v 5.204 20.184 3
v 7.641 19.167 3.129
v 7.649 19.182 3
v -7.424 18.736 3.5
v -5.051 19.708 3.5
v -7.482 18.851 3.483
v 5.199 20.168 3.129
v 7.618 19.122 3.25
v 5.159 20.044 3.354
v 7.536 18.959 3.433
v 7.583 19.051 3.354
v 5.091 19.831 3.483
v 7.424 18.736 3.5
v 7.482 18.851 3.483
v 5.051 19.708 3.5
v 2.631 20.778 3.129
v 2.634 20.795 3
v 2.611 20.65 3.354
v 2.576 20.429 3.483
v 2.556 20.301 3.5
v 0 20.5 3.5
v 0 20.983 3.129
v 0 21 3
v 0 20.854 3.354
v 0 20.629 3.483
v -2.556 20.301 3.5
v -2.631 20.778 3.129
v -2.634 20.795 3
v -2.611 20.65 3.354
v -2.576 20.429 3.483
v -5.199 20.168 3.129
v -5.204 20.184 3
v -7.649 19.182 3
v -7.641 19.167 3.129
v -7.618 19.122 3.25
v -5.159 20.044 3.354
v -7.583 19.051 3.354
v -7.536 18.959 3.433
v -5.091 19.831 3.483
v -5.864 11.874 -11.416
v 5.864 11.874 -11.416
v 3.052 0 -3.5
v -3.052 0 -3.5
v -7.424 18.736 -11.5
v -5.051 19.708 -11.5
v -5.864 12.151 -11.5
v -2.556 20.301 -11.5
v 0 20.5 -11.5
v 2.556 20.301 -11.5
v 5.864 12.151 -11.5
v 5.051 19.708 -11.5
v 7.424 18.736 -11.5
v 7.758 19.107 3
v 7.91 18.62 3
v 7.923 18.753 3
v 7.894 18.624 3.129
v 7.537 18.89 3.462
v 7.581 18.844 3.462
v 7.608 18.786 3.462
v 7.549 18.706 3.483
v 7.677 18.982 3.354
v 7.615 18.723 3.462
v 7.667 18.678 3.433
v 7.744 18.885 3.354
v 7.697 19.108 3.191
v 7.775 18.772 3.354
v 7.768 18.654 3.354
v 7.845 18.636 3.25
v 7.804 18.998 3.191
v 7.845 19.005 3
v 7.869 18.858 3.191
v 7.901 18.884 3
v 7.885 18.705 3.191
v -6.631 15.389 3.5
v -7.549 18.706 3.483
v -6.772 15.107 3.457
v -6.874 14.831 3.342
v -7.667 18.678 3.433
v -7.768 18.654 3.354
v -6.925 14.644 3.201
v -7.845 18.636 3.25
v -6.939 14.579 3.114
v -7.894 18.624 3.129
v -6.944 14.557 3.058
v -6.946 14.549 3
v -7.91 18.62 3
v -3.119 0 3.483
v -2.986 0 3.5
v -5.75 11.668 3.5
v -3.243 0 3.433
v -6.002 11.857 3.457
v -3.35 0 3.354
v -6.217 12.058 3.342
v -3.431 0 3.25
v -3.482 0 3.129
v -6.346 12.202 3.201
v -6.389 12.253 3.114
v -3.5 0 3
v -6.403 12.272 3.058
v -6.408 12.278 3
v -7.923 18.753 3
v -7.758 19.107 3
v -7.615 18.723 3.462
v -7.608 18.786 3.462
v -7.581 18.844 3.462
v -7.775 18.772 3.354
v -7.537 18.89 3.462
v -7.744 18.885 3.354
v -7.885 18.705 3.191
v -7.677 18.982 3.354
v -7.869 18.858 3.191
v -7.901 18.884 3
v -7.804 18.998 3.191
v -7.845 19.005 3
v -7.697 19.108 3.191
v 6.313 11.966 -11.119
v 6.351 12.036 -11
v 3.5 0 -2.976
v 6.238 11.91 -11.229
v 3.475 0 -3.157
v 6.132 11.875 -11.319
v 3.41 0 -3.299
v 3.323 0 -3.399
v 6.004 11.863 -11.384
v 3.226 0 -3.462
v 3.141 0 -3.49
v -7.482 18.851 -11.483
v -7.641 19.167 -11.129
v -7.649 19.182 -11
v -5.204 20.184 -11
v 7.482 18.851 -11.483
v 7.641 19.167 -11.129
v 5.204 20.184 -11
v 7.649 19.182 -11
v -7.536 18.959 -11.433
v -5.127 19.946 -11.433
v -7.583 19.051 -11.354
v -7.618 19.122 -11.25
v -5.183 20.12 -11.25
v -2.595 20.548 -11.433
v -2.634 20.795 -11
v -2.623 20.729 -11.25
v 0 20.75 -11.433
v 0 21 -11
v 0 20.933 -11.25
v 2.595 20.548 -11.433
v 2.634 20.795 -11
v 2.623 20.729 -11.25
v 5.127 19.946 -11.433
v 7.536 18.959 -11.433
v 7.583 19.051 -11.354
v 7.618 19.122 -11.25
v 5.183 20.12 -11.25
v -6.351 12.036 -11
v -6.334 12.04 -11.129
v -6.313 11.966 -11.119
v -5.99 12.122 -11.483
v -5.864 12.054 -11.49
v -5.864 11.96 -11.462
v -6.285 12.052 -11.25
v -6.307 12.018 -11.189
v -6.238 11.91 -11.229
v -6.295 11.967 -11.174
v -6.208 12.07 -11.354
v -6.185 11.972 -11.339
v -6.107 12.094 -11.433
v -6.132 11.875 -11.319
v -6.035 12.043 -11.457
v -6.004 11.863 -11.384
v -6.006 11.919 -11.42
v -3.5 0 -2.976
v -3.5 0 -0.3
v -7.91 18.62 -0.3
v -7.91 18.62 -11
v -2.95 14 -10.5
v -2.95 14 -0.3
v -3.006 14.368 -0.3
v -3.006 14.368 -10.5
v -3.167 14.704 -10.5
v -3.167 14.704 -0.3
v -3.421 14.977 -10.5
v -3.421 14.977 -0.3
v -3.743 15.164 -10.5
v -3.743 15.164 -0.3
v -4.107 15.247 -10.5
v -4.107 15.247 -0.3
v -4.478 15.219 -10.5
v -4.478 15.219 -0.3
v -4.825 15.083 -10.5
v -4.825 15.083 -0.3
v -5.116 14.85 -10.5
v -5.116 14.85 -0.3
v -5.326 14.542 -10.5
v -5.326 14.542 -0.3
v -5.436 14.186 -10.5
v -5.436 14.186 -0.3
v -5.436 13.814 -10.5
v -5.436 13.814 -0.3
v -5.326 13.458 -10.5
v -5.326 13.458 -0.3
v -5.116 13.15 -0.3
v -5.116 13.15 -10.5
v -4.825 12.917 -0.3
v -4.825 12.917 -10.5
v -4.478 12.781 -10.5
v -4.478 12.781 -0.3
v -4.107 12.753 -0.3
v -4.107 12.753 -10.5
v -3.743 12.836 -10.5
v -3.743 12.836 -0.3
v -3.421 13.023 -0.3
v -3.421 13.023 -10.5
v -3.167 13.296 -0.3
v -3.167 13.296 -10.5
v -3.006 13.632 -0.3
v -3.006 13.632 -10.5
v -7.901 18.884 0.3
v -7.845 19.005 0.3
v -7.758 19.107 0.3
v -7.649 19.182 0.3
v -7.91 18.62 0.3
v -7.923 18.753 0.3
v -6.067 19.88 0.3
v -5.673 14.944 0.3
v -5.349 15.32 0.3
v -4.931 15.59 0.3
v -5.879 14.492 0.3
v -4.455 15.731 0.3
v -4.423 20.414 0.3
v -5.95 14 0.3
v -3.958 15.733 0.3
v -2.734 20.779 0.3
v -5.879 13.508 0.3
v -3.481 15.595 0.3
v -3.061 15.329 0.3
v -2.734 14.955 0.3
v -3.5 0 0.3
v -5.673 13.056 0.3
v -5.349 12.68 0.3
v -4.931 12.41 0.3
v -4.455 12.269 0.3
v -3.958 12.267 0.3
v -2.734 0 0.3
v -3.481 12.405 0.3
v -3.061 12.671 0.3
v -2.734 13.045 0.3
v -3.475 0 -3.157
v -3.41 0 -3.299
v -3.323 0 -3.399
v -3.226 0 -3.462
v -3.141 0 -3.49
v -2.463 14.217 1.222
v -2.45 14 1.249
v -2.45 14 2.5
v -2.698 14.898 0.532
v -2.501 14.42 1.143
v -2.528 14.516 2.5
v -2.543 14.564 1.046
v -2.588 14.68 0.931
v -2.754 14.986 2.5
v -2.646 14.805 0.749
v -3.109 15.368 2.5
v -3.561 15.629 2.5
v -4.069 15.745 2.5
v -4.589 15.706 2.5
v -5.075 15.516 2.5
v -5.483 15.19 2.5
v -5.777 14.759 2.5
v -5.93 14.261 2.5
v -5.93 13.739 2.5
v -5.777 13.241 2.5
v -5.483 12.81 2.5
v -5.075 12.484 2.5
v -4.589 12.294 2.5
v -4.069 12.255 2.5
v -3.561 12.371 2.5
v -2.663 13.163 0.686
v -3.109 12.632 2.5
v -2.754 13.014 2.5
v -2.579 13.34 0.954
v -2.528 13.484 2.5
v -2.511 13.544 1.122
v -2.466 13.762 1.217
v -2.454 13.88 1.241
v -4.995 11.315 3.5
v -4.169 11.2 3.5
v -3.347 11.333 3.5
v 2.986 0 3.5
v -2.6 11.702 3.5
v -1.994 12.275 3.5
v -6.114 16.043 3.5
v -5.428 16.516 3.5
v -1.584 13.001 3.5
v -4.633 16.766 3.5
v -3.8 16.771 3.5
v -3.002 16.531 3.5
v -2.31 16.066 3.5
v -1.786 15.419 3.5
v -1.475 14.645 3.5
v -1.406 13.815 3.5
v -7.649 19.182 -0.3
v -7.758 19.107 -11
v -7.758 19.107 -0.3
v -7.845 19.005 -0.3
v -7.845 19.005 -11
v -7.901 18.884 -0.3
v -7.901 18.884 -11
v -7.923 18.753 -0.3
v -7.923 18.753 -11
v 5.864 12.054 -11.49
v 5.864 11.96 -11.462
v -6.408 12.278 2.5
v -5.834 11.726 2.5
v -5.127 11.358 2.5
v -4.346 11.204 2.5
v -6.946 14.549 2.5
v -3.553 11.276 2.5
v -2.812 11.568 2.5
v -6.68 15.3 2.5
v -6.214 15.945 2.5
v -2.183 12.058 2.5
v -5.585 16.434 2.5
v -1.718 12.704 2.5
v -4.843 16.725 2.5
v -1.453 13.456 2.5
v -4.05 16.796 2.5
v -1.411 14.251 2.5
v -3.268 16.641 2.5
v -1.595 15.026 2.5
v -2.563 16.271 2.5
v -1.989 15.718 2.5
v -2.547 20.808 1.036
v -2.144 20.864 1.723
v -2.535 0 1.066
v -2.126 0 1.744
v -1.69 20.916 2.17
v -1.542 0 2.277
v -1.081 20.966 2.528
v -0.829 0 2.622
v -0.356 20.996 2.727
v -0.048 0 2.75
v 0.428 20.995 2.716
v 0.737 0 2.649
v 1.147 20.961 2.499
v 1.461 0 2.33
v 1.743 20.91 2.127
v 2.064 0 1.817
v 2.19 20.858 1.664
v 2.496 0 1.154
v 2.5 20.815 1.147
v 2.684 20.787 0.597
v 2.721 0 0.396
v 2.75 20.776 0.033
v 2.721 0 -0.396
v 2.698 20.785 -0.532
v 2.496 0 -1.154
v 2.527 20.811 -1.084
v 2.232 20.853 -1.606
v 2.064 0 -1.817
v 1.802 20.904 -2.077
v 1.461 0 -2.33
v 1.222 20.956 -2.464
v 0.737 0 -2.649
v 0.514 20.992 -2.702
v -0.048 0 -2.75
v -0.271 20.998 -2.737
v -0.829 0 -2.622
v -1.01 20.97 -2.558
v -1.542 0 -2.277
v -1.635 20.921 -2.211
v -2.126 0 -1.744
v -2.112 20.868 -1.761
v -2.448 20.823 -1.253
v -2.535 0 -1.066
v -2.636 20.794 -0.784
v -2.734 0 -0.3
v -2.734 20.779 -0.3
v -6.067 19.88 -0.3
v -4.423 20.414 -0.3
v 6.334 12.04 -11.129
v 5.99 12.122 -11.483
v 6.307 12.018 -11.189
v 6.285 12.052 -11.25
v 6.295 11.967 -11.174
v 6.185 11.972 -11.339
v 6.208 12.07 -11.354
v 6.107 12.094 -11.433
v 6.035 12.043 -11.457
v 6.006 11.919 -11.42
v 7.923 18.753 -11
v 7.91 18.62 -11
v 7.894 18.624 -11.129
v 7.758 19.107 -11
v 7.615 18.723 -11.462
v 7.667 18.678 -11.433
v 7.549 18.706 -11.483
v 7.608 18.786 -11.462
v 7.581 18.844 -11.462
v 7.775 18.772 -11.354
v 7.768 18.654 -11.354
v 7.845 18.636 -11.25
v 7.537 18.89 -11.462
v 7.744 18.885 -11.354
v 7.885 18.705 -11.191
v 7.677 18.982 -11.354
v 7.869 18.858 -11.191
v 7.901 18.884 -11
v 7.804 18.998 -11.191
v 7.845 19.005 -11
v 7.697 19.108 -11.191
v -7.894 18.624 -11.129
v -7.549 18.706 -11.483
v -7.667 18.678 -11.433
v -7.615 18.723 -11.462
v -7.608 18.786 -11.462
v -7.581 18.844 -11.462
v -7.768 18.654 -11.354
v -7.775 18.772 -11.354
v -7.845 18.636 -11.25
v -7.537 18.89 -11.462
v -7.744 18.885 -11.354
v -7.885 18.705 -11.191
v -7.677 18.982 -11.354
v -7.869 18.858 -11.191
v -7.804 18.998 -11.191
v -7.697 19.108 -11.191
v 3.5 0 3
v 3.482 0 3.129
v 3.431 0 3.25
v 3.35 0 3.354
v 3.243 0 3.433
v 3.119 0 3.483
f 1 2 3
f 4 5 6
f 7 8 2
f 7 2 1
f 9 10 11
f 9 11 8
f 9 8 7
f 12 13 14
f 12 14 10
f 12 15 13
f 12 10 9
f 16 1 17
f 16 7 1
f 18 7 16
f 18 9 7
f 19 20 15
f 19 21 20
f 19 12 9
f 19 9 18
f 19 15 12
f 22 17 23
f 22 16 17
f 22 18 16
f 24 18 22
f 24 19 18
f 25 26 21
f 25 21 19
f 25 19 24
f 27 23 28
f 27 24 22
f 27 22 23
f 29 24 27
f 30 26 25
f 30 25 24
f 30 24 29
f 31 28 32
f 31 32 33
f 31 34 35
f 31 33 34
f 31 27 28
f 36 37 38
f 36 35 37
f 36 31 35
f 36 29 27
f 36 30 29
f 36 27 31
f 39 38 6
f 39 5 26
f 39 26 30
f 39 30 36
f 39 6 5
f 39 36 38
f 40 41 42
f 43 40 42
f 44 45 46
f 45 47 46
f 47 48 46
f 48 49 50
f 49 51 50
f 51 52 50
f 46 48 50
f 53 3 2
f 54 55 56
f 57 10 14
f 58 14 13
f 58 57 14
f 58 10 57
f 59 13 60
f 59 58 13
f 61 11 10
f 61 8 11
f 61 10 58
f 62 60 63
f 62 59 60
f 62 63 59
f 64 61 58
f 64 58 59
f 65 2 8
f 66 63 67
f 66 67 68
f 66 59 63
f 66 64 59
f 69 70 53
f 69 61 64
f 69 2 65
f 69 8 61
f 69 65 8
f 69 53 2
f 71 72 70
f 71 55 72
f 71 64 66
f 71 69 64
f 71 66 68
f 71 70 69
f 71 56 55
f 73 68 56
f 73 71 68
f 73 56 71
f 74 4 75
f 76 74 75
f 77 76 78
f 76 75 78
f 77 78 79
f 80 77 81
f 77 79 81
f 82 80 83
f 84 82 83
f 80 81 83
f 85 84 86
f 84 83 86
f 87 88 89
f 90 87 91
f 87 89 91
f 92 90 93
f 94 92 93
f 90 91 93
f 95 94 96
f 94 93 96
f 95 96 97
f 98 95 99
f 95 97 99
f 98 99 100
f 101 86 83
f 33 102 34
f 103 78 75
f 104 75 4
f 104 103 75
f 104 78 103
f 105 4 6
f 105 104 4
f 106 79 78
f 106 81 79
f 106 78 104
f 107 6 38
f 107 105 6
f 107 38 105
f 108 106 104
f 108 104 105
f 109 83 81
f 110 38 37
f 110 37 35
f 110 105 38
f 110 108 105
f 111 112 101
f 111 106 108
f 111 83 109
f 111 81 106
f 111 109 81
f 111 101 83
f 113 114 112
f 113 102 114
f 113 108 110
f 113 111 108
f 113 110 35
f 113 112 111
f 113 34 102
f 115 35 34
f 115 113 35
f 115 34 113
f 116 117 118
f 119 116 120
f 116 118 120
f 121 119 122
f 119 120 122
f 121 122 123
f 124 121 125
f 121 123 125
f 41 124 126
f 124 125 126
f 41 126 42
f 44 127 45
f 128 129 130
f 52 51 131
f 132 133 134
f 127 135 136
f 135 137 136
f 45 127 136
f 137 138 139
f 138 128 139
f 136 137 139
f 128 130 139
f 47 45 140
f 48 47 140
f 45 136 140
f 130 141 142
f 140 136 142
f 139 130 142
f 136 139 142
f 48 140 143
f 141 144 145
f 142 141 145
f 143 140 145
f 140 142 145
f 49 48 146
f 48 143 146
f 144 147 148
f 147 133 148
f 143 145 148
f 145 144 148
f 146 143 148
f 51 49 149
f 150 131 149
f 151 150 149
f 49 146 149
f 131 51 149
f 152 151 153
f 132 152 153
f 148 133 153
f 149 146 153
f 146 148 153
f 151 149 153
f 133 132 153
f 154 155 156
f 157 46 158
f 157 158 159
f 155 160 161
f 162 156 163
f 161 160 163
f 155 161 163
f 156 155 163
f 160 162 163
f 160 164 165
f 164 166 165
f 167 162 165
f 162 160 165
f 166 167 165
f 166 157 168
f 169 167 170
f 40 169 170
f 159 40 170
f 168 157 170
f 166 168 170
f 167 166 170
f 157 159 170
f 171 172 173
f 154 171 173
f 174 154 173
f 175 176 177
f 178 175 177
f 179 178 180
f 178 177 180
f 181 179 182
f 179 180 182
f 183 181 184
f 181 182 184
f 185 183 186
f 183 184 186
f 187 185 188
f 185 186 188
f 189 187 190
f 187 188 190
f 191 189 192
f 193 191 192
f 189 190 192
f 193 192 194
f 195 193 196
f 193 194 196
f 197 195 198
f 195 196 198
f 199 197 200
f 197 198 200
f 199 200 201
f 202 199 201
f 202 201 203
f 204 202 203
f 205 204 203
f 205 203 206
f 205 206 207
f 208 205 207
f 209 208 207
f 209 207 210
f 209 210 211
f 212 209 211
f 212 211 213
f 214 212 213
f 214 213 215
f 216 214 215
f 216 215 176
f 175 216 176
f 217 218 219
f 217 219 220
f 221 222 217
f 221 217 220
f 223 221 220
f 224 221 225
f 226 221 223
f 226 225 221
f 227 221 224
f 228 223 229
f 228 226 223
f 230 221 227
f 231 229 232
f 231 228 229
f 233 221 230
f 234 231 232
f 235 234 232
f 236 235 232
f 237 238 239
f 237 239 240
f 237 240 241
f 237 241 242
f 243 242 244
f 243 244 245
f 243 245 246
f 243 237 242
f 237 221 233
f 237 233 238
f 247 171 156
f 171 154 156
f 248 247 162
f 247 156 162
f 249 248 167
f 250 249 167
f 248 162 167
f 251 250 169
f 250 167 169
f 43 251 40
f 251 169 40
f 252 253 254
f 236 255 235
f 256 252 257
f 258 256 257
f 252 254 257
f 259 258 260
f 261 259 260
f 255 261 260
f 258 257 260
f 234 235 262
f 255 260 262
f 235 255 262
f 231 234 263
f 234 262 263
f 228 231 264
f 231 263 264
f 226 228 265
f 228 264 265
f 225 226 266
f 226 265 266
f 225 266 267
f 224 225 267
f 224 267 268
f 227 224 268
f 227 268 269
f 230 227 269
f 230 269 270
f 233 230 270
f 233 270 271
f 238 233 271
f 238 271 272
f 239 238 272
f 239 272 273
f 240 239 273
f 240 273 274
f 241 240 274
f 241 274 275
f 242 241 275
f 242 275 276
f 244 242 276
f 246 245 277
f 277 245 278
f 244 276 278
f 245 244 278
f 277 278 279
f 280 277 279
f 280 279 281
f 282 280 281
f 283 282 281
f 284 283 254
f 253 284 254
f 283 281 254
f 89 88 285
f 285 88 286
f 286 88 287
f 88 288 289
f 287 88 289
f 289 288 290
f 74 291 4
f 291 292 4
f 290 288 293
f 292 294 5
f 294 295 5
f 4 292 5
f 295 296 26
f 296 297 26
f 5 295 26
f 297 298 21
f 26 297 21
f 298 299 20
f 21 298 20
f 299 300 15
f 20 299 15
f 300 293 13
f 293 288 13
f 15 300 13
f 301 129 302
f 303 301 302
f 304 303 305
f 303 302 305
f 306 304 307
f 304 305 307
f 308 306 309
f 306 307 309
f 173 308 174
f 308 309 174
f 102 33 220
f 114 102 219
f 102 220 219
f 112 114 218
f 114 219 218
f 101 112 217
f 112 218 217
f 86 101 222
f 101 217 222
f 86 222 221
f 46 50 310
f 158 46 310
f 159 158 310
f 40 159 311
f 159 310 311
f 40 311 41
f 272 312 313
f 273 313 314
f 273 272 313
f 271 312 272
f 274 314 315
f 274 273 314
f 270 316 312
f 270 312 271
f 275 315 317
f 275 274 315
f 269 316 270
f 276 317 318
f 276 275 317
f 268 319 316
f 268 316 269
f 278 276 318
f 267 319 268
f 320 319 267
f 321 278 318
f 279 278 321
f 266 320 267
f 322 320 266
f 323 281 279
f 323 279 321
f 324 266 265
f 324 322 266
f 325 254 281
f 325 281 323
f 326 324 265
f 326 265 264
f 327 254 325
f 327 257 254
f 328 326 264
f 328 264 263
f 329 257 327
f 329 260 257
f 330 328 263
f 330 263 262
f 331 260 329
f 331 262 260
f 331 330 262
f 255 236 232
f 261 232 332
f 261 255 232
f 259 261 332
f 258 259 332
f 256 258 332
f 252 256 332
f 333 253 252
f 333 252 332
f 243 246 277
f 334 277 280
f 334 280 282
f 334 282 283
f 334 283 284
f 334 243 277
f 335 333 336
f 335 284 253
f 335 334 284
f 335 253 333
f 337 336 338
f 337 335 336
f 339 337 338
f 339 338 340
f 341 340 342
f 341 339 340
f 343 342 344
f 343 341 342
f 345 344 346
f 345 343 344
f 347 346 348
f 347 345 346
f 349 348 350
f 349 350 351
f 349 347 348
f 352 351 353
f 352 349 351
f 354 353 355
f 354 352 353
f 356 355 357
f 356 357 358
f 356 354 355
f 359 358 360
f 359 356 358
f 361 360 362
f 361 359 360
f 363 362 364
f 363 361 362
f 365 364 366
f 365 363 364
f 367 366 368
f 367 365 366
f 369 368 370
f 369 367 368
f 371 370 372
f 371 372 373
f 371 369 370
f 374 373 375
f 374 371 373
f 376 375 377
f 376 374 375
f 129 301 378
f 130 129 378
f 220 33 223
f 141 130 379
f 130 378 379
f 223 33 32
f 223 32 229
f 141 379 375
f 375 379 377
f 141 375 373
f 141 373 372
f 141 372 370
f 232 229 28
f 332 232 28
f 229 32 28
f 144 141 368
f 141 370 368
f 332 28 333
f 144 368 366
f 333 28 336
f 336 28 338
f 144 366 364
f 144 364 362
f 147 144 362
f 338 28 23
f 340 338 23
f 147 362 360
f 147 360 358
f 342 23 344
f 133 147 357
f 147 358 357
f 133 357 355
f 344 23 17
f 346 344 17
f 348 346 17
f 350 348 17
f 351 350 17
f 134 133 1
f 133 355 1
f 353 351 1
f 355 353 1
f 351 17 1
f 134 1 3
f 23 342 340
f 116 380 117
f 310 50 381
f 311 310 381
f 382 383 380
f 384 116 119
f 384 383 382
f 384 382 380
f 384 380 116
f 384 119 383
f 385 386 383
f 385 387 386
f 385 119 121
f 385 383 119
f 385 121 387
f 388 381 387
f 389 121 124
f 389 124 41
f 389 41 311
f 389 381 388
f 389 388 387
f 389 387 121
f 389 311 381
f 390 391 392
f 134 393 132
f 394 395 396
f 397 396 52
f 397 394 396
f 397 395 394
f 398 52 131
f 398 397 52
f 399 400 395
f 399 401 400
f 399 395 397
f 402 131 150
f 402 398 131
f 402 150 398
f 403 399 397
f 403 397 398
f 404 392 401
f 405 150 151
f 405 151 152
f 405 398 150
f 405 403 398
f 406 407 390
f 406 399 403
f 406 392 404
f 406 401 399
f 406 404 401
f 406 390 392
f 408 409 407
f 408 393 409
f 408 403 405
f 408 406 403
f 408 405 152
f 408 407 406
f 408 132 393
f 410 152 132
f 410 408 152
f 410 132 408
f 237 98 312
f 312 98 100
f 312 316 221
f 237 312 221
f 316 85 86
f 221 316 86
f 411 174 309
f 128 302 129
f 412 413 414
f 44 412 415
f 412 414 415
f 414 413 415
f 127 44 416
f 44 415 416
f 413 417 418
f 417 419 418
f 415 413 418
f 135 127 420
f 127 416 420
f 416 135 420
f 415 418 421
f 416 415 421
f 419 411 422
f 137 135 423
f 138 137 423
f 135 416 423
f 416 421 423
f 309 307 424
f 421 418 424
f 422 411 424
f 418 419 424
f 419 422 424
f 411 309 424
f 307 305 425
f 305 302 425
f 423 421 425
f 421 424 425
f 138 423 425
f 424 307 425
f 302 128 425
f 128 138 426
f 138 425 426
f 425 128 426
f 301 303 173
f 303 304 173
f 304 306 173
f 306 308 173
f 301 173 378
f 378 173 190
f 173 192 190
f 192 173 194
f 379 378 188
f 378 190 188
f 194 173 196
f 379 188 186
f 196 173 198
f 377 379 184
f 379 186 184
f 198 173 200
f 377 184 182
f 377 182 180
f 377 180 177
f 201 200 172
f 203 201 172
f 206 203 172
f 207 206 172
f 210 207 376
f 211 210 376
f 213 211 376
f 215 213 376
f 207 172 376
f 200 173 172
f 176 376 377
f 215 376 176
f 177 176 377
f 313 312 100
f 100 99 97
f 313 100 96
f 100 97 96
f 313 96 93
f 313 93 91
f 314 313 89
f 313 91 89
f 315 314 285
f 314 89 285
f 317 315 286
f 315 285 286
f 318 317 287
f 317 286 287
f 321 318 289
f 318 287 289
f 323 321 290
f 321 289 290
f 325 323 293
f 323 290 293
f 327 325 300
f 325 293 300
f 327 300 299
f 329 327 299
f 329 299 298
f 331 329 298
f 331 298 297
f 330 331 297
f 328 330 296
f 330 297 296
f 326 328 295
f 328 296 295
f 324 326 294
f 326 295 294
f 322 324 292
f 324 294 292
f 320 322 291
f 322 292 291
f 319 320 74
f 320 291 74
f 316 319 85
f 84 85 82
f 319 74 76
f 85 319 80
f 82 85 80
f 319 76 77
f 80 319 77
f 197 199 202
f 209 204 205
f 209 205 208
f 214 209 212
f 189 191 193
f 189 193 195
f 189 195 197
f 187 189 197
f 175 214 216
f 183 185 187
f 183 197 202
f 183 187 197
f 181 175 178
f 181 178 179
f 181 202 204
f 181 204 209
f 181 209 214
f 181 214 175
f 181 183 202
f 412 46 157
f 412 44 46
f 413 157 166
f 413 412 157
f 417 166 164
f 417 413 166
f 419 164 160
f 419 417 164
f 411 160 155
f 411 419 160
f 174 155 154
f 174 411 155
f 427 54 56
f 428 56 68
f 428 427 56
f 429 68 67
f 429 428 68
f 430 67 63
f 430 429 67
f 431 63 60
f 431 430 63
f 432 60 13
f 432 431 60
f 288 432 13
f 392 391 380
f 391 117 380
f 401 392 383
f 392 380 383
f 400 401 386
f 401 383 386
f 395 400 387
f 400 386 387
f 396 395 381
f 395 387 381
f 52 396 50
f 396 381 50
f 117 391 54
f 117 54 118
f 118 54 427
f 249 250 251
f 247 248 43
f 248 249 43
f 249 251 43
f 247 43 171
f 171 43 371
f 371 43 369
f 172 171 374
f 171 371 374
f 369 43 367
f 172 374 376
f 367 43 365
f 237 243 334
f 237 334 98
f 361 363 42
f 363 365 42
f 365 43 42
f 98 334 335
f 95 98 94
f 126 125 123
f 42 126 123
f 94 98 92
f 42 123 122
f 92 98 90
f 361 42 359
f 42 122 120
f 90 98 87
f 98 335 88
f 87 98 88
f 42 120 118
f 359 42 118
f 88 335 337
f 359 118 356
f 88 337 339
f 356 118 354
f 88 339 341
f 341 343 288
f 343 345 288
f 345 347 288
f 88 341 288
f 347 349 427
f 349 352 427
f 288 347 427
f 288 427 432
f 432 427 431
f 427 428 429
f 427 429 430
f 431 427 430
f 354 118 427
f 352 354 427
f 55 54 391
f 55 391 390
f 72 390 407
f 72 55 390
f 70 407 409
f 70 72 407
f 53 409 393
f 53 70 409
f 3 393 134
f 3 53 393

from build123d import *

# Parameters (mm, degrees)
EXTRUSION1_DEPTH             = 8
ESQUISSE2_OUTSIDE_W          = 24.072
ESQUISSE2_OUTSIDE_H          = 29.072
ENL_V_MAT_EXTRU_1_DEPTH      = 4.5
ENL_V_MAT_EXTRU_1_DEPTH_BACK = 12.5
CONG_1_R                     = 0.5
ESQUISSE3_R                  = 2.75
ENL_V_MAT_EXTRU_3_DEPTH      = 22
ESQUISSE4_W                  = 7.923568605
ESQUISSE4_H                  = 0.6
ENL_V_MAT_EXTRU_4_DEPTH      = 22.0000001
ESQUISSE5_R                  = 1.25
ENL_V_MAT_EXTRU_5_DEPTH      = 14
ENL_V_MAT_EXTRU_7_REACH      = 17
ESQUISSE7_R                  = 1.75
ESQUISSE6_R                  = 2.8
ENL_V_MAT_EXTRU_6_DEPTH      = 1


with BuildPart() as part:
    # Esquisse1 → Extrusion1 (new body, symmetric)
    with BuildSketch(Plane(origin=(0, 0, 0), x_dir=(0, 0, -1), z_dir=(1, 0, 0))):
        Polygon((3.5, 0), (-3.5, 0), (-3.5, 21), (11.5, 21), (11.5, 12), align=None)
    extrude(amount=EXTRUSION1_DEPTH, both=True)

    # Esquisse2 outside → Enlèv. mat.-Extru.1 (cut, two sides)
    with BuildSketch(Plane.XY) as enl_v_mat_extru_1_sk:
        with Locations((0, 10.5)):
            Rectangle(ESQUISSE2_OUTSIDE_W, ESQUISSE2_OUTSIDE_H)
        with BuildLine():
            Line((-3.5, 0), (-8, 19))
            ThreePointArc((-8, 19), (0, 21), (8, 19))
            Line((8, 19), (3.5, 0))
            Line((3.5, 0), (-3.5, 0))
        make_face(mode=Mode.SUBTRACT)
    extrude(amount=ENL_V_MAT_EXTRU_1_DEPTH, mode=Mode.SUBTRACT)
    extrude(enl_v_mat_extru_1_sk.sketch, amount=-ENL_V_MAT_EXTRU_1_DEPTH_BACK, mode=Mode.SUBTRACT)

    # Congé1
    cong_1_edges = [part.edges().sort_by_distance(p)[0] for p in [
        (0, 12, -11.5),
        (5.75, 9.5, 3.5),
        (7.171052632, 15.5, -11.5),
        (-7.171052632, 15.5, -11.5),
        (0, 21, -11.5),
        (-8, 19, -4),
        (-5.75, 9.5, 3.5),
        (8, 19, -4),
        (0, 21, 3.5),
        (-4.921052632, 6, -7.5),
        (4.921052632, 6, -7.5),
    ]]
    fillet(cong_1_edges, radius=CONG_1_R)

    # Esquisse3 → Enlèv. mat.-Extru.3 (cut, through all)
    with BuildSketch(Plane(origin=(0, 0, 0), x_dir=(1, 0, 0), z_dir=(0, 1, 0))):
        with Locations(Location((0, 0, 0), (0, 0, 90))):  # turned: the seam where the file's is
            Circle(ESQUISSE3_R)
    extrude(amount=ENL_V_MAT_EXTRU_3_DEPTH, mode=Mode.SUBTRACT)

    # Esquisse4 → Enlèv. mat.-Extru.4 (cut, through all)
    with BuildSketch(Plane(origin=(0, 0, 0), x_dir=(1, 0, 0), z_dir=(0, 1, 0))):
        with Locations((-3.961784303, 0)):
            Rectangle(ESQUISSE4_W, ESQUISSE4_H)
    extrude(amount=ENL_V_MAT_EXTRU_4_DEPTH, mode=Mode.SUBTRACT)

    # Esquisse5 → Enlèv. mat.-Extru.5 (cut)
    with BuildSketch(Plane.XY.offset(3.5)):
        with Locations((-4.2, 14)):
            Circle(ESQUISSE5_R)
    extrude(amount=-ENL_V_MAT_EXTRU_5_DEPTH, mode=Mode.SUBTRACT)

    # Esquisse7 → Enlèv. mat.-Extru.7 (cut, up to next)
    with BuildSketch(Plane.XY.offset(3.5), mode=Mode.PRIVATE) as enl_v_mat_extru_7_sk1:
        with Locations((-4.2, 14)):
            Circle(ESQUISSE7_R)
    enl_v_mat_extru_7_tool1 = extrude(enl_v_mat_extru_7_sk1.sketch, amount=-ENL_V_MAT_EXTRU_7_REACH, mode=Mode.PRIVATE) & part.part
    add(enl_v_mat_extru_7_tool1.solids().sort_by_distance((-4.2, 14, 3.5))[0], mode=Mode.SUBTRACT)

    # Esquisse6 → Enlèv. mat.-Extru.6 (cut)
    with BuildSketch(Plane.XY.offset(3.5)):
        with Locations((-4.2, 14)):
            Circle(ESQUISSE6_R)
    extrude(amount=-ENL_V_MAT_EXTRU_6_DEPTH, mode=Mode.SUBTRACT)


solid = part.part
